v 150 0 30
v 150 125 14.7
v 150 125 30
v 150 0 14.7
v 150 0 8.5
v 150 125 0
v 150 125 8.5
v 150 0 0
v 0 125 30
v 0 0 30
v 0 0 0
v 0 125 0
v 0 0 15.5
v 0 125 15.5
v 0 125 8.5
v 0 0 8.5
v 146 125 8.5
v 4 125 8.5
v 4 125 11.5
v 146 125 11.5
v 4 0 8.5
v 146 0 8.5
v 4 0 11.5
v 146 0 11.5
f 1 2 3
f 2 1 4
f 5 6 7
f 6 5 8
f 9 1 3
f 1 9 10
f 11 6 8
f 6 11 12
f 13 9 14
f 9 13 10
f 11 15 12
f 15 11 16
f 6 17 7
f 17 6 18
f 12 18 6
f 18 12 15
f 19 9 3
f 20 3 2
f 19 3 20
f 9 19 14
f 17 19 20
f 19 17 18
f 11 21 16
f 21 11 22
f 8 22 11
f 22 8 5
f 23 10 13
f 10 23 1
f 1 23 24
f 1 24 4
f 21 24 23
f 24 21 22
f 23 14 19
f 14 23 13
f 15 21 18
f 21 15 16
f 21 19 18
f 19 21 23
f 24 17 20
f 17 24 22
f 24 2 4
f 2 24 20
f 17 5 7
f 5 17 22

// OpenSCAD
fillerfilter();

// The standard filter
module filter() {
  difference() {
    union() {
      difference() {
        cube([150,145,30]);
        translate([2,2,-5]) cube([146,141,40]);
      }
      translate([2,2,0]) {
        difference() {
          cube([146, 141, 30]);
          translate([0,0,-5]) {
            for (j = [0:16:145]) {
              for (i = [0:10:145]) {
                translate([i,j,0]) rotate([0,0,30]) cylinder(h=40, d=10, $fn=6);
                translate([i+5,j+8,0]) rotate([0,0,30]) cylinder(h=40, d=10, $fn=6);
              }
            }
          }
        }
      }
      cube([5,145,30]);
      translate([145,0,0]) cube([5,125,30]);
    }
    hull() {
      translate([-1, -1, 8.5]) cube([5,152,3]);
      translate([-5, -1, 11.5]) cube([5,152,3]);
    }
    hull() {
      translate([146, -1, 8.5]) cube([5,152,3]);
      translate([151, -1, 11.5]) cube([5,152,3]);
    }
  }
}

// The filter resized to fit the Replicator, with wall widths optimised for Replicator
module r1dfilter() {
  difference() {
    union() {
      difference() {
        cube([150,125,30]);
        translate([2,2,-5]) cube([146,121,40]);
      }
      translate([2,2,0]) {
        difference() {
          cube([146, 121, 30]);
          translate([0,0,-5]) {
            for (j = [0:15.5:125]) {
              for (i = [0:9:145]) {
                translate([i,j,0]) rotate([0,0,30]) cylinder(h=40, d=10, $fn=6);
                translate([i+4.5,j+7.75,0]) rotate([0,0,30]) cylinder(h=40, d=10, $fn=6);
              }
            }
          }
        }
      }
      cube([5,125,30]);
      translate([145,0,0]) cube([5,125,30]);
    }
    hull() {
      translate([-1, -1, 8.5]) cube([5,152,3]);
      translate([-5, -1, 12.5]) cube([5,152,3]);
    }
    hull() {
      translate([146, -1, 8.5]) cube([5,152,3]);
      translate([151, -1, 12.5]) cube([5,152,3]);
    }
  }
}

// Sized to fit the Replicator, no holes (use slicer infill settings to generate honeycomb)
module fillerfilter() {
  difference() {
    cube([150,125,30]);
    hull() {
      translate([-1, -1, 8.5]) cube([5,152,3]);
      translate([-5, -1, 12.5]) cube([5,152,3]);
    }
    hull() {
      translate([146, -1, 8.5]) cube([5,152,3]);
      translate([151, -1, 12.5]) cube([5,152,3]);
    }
  }
}
